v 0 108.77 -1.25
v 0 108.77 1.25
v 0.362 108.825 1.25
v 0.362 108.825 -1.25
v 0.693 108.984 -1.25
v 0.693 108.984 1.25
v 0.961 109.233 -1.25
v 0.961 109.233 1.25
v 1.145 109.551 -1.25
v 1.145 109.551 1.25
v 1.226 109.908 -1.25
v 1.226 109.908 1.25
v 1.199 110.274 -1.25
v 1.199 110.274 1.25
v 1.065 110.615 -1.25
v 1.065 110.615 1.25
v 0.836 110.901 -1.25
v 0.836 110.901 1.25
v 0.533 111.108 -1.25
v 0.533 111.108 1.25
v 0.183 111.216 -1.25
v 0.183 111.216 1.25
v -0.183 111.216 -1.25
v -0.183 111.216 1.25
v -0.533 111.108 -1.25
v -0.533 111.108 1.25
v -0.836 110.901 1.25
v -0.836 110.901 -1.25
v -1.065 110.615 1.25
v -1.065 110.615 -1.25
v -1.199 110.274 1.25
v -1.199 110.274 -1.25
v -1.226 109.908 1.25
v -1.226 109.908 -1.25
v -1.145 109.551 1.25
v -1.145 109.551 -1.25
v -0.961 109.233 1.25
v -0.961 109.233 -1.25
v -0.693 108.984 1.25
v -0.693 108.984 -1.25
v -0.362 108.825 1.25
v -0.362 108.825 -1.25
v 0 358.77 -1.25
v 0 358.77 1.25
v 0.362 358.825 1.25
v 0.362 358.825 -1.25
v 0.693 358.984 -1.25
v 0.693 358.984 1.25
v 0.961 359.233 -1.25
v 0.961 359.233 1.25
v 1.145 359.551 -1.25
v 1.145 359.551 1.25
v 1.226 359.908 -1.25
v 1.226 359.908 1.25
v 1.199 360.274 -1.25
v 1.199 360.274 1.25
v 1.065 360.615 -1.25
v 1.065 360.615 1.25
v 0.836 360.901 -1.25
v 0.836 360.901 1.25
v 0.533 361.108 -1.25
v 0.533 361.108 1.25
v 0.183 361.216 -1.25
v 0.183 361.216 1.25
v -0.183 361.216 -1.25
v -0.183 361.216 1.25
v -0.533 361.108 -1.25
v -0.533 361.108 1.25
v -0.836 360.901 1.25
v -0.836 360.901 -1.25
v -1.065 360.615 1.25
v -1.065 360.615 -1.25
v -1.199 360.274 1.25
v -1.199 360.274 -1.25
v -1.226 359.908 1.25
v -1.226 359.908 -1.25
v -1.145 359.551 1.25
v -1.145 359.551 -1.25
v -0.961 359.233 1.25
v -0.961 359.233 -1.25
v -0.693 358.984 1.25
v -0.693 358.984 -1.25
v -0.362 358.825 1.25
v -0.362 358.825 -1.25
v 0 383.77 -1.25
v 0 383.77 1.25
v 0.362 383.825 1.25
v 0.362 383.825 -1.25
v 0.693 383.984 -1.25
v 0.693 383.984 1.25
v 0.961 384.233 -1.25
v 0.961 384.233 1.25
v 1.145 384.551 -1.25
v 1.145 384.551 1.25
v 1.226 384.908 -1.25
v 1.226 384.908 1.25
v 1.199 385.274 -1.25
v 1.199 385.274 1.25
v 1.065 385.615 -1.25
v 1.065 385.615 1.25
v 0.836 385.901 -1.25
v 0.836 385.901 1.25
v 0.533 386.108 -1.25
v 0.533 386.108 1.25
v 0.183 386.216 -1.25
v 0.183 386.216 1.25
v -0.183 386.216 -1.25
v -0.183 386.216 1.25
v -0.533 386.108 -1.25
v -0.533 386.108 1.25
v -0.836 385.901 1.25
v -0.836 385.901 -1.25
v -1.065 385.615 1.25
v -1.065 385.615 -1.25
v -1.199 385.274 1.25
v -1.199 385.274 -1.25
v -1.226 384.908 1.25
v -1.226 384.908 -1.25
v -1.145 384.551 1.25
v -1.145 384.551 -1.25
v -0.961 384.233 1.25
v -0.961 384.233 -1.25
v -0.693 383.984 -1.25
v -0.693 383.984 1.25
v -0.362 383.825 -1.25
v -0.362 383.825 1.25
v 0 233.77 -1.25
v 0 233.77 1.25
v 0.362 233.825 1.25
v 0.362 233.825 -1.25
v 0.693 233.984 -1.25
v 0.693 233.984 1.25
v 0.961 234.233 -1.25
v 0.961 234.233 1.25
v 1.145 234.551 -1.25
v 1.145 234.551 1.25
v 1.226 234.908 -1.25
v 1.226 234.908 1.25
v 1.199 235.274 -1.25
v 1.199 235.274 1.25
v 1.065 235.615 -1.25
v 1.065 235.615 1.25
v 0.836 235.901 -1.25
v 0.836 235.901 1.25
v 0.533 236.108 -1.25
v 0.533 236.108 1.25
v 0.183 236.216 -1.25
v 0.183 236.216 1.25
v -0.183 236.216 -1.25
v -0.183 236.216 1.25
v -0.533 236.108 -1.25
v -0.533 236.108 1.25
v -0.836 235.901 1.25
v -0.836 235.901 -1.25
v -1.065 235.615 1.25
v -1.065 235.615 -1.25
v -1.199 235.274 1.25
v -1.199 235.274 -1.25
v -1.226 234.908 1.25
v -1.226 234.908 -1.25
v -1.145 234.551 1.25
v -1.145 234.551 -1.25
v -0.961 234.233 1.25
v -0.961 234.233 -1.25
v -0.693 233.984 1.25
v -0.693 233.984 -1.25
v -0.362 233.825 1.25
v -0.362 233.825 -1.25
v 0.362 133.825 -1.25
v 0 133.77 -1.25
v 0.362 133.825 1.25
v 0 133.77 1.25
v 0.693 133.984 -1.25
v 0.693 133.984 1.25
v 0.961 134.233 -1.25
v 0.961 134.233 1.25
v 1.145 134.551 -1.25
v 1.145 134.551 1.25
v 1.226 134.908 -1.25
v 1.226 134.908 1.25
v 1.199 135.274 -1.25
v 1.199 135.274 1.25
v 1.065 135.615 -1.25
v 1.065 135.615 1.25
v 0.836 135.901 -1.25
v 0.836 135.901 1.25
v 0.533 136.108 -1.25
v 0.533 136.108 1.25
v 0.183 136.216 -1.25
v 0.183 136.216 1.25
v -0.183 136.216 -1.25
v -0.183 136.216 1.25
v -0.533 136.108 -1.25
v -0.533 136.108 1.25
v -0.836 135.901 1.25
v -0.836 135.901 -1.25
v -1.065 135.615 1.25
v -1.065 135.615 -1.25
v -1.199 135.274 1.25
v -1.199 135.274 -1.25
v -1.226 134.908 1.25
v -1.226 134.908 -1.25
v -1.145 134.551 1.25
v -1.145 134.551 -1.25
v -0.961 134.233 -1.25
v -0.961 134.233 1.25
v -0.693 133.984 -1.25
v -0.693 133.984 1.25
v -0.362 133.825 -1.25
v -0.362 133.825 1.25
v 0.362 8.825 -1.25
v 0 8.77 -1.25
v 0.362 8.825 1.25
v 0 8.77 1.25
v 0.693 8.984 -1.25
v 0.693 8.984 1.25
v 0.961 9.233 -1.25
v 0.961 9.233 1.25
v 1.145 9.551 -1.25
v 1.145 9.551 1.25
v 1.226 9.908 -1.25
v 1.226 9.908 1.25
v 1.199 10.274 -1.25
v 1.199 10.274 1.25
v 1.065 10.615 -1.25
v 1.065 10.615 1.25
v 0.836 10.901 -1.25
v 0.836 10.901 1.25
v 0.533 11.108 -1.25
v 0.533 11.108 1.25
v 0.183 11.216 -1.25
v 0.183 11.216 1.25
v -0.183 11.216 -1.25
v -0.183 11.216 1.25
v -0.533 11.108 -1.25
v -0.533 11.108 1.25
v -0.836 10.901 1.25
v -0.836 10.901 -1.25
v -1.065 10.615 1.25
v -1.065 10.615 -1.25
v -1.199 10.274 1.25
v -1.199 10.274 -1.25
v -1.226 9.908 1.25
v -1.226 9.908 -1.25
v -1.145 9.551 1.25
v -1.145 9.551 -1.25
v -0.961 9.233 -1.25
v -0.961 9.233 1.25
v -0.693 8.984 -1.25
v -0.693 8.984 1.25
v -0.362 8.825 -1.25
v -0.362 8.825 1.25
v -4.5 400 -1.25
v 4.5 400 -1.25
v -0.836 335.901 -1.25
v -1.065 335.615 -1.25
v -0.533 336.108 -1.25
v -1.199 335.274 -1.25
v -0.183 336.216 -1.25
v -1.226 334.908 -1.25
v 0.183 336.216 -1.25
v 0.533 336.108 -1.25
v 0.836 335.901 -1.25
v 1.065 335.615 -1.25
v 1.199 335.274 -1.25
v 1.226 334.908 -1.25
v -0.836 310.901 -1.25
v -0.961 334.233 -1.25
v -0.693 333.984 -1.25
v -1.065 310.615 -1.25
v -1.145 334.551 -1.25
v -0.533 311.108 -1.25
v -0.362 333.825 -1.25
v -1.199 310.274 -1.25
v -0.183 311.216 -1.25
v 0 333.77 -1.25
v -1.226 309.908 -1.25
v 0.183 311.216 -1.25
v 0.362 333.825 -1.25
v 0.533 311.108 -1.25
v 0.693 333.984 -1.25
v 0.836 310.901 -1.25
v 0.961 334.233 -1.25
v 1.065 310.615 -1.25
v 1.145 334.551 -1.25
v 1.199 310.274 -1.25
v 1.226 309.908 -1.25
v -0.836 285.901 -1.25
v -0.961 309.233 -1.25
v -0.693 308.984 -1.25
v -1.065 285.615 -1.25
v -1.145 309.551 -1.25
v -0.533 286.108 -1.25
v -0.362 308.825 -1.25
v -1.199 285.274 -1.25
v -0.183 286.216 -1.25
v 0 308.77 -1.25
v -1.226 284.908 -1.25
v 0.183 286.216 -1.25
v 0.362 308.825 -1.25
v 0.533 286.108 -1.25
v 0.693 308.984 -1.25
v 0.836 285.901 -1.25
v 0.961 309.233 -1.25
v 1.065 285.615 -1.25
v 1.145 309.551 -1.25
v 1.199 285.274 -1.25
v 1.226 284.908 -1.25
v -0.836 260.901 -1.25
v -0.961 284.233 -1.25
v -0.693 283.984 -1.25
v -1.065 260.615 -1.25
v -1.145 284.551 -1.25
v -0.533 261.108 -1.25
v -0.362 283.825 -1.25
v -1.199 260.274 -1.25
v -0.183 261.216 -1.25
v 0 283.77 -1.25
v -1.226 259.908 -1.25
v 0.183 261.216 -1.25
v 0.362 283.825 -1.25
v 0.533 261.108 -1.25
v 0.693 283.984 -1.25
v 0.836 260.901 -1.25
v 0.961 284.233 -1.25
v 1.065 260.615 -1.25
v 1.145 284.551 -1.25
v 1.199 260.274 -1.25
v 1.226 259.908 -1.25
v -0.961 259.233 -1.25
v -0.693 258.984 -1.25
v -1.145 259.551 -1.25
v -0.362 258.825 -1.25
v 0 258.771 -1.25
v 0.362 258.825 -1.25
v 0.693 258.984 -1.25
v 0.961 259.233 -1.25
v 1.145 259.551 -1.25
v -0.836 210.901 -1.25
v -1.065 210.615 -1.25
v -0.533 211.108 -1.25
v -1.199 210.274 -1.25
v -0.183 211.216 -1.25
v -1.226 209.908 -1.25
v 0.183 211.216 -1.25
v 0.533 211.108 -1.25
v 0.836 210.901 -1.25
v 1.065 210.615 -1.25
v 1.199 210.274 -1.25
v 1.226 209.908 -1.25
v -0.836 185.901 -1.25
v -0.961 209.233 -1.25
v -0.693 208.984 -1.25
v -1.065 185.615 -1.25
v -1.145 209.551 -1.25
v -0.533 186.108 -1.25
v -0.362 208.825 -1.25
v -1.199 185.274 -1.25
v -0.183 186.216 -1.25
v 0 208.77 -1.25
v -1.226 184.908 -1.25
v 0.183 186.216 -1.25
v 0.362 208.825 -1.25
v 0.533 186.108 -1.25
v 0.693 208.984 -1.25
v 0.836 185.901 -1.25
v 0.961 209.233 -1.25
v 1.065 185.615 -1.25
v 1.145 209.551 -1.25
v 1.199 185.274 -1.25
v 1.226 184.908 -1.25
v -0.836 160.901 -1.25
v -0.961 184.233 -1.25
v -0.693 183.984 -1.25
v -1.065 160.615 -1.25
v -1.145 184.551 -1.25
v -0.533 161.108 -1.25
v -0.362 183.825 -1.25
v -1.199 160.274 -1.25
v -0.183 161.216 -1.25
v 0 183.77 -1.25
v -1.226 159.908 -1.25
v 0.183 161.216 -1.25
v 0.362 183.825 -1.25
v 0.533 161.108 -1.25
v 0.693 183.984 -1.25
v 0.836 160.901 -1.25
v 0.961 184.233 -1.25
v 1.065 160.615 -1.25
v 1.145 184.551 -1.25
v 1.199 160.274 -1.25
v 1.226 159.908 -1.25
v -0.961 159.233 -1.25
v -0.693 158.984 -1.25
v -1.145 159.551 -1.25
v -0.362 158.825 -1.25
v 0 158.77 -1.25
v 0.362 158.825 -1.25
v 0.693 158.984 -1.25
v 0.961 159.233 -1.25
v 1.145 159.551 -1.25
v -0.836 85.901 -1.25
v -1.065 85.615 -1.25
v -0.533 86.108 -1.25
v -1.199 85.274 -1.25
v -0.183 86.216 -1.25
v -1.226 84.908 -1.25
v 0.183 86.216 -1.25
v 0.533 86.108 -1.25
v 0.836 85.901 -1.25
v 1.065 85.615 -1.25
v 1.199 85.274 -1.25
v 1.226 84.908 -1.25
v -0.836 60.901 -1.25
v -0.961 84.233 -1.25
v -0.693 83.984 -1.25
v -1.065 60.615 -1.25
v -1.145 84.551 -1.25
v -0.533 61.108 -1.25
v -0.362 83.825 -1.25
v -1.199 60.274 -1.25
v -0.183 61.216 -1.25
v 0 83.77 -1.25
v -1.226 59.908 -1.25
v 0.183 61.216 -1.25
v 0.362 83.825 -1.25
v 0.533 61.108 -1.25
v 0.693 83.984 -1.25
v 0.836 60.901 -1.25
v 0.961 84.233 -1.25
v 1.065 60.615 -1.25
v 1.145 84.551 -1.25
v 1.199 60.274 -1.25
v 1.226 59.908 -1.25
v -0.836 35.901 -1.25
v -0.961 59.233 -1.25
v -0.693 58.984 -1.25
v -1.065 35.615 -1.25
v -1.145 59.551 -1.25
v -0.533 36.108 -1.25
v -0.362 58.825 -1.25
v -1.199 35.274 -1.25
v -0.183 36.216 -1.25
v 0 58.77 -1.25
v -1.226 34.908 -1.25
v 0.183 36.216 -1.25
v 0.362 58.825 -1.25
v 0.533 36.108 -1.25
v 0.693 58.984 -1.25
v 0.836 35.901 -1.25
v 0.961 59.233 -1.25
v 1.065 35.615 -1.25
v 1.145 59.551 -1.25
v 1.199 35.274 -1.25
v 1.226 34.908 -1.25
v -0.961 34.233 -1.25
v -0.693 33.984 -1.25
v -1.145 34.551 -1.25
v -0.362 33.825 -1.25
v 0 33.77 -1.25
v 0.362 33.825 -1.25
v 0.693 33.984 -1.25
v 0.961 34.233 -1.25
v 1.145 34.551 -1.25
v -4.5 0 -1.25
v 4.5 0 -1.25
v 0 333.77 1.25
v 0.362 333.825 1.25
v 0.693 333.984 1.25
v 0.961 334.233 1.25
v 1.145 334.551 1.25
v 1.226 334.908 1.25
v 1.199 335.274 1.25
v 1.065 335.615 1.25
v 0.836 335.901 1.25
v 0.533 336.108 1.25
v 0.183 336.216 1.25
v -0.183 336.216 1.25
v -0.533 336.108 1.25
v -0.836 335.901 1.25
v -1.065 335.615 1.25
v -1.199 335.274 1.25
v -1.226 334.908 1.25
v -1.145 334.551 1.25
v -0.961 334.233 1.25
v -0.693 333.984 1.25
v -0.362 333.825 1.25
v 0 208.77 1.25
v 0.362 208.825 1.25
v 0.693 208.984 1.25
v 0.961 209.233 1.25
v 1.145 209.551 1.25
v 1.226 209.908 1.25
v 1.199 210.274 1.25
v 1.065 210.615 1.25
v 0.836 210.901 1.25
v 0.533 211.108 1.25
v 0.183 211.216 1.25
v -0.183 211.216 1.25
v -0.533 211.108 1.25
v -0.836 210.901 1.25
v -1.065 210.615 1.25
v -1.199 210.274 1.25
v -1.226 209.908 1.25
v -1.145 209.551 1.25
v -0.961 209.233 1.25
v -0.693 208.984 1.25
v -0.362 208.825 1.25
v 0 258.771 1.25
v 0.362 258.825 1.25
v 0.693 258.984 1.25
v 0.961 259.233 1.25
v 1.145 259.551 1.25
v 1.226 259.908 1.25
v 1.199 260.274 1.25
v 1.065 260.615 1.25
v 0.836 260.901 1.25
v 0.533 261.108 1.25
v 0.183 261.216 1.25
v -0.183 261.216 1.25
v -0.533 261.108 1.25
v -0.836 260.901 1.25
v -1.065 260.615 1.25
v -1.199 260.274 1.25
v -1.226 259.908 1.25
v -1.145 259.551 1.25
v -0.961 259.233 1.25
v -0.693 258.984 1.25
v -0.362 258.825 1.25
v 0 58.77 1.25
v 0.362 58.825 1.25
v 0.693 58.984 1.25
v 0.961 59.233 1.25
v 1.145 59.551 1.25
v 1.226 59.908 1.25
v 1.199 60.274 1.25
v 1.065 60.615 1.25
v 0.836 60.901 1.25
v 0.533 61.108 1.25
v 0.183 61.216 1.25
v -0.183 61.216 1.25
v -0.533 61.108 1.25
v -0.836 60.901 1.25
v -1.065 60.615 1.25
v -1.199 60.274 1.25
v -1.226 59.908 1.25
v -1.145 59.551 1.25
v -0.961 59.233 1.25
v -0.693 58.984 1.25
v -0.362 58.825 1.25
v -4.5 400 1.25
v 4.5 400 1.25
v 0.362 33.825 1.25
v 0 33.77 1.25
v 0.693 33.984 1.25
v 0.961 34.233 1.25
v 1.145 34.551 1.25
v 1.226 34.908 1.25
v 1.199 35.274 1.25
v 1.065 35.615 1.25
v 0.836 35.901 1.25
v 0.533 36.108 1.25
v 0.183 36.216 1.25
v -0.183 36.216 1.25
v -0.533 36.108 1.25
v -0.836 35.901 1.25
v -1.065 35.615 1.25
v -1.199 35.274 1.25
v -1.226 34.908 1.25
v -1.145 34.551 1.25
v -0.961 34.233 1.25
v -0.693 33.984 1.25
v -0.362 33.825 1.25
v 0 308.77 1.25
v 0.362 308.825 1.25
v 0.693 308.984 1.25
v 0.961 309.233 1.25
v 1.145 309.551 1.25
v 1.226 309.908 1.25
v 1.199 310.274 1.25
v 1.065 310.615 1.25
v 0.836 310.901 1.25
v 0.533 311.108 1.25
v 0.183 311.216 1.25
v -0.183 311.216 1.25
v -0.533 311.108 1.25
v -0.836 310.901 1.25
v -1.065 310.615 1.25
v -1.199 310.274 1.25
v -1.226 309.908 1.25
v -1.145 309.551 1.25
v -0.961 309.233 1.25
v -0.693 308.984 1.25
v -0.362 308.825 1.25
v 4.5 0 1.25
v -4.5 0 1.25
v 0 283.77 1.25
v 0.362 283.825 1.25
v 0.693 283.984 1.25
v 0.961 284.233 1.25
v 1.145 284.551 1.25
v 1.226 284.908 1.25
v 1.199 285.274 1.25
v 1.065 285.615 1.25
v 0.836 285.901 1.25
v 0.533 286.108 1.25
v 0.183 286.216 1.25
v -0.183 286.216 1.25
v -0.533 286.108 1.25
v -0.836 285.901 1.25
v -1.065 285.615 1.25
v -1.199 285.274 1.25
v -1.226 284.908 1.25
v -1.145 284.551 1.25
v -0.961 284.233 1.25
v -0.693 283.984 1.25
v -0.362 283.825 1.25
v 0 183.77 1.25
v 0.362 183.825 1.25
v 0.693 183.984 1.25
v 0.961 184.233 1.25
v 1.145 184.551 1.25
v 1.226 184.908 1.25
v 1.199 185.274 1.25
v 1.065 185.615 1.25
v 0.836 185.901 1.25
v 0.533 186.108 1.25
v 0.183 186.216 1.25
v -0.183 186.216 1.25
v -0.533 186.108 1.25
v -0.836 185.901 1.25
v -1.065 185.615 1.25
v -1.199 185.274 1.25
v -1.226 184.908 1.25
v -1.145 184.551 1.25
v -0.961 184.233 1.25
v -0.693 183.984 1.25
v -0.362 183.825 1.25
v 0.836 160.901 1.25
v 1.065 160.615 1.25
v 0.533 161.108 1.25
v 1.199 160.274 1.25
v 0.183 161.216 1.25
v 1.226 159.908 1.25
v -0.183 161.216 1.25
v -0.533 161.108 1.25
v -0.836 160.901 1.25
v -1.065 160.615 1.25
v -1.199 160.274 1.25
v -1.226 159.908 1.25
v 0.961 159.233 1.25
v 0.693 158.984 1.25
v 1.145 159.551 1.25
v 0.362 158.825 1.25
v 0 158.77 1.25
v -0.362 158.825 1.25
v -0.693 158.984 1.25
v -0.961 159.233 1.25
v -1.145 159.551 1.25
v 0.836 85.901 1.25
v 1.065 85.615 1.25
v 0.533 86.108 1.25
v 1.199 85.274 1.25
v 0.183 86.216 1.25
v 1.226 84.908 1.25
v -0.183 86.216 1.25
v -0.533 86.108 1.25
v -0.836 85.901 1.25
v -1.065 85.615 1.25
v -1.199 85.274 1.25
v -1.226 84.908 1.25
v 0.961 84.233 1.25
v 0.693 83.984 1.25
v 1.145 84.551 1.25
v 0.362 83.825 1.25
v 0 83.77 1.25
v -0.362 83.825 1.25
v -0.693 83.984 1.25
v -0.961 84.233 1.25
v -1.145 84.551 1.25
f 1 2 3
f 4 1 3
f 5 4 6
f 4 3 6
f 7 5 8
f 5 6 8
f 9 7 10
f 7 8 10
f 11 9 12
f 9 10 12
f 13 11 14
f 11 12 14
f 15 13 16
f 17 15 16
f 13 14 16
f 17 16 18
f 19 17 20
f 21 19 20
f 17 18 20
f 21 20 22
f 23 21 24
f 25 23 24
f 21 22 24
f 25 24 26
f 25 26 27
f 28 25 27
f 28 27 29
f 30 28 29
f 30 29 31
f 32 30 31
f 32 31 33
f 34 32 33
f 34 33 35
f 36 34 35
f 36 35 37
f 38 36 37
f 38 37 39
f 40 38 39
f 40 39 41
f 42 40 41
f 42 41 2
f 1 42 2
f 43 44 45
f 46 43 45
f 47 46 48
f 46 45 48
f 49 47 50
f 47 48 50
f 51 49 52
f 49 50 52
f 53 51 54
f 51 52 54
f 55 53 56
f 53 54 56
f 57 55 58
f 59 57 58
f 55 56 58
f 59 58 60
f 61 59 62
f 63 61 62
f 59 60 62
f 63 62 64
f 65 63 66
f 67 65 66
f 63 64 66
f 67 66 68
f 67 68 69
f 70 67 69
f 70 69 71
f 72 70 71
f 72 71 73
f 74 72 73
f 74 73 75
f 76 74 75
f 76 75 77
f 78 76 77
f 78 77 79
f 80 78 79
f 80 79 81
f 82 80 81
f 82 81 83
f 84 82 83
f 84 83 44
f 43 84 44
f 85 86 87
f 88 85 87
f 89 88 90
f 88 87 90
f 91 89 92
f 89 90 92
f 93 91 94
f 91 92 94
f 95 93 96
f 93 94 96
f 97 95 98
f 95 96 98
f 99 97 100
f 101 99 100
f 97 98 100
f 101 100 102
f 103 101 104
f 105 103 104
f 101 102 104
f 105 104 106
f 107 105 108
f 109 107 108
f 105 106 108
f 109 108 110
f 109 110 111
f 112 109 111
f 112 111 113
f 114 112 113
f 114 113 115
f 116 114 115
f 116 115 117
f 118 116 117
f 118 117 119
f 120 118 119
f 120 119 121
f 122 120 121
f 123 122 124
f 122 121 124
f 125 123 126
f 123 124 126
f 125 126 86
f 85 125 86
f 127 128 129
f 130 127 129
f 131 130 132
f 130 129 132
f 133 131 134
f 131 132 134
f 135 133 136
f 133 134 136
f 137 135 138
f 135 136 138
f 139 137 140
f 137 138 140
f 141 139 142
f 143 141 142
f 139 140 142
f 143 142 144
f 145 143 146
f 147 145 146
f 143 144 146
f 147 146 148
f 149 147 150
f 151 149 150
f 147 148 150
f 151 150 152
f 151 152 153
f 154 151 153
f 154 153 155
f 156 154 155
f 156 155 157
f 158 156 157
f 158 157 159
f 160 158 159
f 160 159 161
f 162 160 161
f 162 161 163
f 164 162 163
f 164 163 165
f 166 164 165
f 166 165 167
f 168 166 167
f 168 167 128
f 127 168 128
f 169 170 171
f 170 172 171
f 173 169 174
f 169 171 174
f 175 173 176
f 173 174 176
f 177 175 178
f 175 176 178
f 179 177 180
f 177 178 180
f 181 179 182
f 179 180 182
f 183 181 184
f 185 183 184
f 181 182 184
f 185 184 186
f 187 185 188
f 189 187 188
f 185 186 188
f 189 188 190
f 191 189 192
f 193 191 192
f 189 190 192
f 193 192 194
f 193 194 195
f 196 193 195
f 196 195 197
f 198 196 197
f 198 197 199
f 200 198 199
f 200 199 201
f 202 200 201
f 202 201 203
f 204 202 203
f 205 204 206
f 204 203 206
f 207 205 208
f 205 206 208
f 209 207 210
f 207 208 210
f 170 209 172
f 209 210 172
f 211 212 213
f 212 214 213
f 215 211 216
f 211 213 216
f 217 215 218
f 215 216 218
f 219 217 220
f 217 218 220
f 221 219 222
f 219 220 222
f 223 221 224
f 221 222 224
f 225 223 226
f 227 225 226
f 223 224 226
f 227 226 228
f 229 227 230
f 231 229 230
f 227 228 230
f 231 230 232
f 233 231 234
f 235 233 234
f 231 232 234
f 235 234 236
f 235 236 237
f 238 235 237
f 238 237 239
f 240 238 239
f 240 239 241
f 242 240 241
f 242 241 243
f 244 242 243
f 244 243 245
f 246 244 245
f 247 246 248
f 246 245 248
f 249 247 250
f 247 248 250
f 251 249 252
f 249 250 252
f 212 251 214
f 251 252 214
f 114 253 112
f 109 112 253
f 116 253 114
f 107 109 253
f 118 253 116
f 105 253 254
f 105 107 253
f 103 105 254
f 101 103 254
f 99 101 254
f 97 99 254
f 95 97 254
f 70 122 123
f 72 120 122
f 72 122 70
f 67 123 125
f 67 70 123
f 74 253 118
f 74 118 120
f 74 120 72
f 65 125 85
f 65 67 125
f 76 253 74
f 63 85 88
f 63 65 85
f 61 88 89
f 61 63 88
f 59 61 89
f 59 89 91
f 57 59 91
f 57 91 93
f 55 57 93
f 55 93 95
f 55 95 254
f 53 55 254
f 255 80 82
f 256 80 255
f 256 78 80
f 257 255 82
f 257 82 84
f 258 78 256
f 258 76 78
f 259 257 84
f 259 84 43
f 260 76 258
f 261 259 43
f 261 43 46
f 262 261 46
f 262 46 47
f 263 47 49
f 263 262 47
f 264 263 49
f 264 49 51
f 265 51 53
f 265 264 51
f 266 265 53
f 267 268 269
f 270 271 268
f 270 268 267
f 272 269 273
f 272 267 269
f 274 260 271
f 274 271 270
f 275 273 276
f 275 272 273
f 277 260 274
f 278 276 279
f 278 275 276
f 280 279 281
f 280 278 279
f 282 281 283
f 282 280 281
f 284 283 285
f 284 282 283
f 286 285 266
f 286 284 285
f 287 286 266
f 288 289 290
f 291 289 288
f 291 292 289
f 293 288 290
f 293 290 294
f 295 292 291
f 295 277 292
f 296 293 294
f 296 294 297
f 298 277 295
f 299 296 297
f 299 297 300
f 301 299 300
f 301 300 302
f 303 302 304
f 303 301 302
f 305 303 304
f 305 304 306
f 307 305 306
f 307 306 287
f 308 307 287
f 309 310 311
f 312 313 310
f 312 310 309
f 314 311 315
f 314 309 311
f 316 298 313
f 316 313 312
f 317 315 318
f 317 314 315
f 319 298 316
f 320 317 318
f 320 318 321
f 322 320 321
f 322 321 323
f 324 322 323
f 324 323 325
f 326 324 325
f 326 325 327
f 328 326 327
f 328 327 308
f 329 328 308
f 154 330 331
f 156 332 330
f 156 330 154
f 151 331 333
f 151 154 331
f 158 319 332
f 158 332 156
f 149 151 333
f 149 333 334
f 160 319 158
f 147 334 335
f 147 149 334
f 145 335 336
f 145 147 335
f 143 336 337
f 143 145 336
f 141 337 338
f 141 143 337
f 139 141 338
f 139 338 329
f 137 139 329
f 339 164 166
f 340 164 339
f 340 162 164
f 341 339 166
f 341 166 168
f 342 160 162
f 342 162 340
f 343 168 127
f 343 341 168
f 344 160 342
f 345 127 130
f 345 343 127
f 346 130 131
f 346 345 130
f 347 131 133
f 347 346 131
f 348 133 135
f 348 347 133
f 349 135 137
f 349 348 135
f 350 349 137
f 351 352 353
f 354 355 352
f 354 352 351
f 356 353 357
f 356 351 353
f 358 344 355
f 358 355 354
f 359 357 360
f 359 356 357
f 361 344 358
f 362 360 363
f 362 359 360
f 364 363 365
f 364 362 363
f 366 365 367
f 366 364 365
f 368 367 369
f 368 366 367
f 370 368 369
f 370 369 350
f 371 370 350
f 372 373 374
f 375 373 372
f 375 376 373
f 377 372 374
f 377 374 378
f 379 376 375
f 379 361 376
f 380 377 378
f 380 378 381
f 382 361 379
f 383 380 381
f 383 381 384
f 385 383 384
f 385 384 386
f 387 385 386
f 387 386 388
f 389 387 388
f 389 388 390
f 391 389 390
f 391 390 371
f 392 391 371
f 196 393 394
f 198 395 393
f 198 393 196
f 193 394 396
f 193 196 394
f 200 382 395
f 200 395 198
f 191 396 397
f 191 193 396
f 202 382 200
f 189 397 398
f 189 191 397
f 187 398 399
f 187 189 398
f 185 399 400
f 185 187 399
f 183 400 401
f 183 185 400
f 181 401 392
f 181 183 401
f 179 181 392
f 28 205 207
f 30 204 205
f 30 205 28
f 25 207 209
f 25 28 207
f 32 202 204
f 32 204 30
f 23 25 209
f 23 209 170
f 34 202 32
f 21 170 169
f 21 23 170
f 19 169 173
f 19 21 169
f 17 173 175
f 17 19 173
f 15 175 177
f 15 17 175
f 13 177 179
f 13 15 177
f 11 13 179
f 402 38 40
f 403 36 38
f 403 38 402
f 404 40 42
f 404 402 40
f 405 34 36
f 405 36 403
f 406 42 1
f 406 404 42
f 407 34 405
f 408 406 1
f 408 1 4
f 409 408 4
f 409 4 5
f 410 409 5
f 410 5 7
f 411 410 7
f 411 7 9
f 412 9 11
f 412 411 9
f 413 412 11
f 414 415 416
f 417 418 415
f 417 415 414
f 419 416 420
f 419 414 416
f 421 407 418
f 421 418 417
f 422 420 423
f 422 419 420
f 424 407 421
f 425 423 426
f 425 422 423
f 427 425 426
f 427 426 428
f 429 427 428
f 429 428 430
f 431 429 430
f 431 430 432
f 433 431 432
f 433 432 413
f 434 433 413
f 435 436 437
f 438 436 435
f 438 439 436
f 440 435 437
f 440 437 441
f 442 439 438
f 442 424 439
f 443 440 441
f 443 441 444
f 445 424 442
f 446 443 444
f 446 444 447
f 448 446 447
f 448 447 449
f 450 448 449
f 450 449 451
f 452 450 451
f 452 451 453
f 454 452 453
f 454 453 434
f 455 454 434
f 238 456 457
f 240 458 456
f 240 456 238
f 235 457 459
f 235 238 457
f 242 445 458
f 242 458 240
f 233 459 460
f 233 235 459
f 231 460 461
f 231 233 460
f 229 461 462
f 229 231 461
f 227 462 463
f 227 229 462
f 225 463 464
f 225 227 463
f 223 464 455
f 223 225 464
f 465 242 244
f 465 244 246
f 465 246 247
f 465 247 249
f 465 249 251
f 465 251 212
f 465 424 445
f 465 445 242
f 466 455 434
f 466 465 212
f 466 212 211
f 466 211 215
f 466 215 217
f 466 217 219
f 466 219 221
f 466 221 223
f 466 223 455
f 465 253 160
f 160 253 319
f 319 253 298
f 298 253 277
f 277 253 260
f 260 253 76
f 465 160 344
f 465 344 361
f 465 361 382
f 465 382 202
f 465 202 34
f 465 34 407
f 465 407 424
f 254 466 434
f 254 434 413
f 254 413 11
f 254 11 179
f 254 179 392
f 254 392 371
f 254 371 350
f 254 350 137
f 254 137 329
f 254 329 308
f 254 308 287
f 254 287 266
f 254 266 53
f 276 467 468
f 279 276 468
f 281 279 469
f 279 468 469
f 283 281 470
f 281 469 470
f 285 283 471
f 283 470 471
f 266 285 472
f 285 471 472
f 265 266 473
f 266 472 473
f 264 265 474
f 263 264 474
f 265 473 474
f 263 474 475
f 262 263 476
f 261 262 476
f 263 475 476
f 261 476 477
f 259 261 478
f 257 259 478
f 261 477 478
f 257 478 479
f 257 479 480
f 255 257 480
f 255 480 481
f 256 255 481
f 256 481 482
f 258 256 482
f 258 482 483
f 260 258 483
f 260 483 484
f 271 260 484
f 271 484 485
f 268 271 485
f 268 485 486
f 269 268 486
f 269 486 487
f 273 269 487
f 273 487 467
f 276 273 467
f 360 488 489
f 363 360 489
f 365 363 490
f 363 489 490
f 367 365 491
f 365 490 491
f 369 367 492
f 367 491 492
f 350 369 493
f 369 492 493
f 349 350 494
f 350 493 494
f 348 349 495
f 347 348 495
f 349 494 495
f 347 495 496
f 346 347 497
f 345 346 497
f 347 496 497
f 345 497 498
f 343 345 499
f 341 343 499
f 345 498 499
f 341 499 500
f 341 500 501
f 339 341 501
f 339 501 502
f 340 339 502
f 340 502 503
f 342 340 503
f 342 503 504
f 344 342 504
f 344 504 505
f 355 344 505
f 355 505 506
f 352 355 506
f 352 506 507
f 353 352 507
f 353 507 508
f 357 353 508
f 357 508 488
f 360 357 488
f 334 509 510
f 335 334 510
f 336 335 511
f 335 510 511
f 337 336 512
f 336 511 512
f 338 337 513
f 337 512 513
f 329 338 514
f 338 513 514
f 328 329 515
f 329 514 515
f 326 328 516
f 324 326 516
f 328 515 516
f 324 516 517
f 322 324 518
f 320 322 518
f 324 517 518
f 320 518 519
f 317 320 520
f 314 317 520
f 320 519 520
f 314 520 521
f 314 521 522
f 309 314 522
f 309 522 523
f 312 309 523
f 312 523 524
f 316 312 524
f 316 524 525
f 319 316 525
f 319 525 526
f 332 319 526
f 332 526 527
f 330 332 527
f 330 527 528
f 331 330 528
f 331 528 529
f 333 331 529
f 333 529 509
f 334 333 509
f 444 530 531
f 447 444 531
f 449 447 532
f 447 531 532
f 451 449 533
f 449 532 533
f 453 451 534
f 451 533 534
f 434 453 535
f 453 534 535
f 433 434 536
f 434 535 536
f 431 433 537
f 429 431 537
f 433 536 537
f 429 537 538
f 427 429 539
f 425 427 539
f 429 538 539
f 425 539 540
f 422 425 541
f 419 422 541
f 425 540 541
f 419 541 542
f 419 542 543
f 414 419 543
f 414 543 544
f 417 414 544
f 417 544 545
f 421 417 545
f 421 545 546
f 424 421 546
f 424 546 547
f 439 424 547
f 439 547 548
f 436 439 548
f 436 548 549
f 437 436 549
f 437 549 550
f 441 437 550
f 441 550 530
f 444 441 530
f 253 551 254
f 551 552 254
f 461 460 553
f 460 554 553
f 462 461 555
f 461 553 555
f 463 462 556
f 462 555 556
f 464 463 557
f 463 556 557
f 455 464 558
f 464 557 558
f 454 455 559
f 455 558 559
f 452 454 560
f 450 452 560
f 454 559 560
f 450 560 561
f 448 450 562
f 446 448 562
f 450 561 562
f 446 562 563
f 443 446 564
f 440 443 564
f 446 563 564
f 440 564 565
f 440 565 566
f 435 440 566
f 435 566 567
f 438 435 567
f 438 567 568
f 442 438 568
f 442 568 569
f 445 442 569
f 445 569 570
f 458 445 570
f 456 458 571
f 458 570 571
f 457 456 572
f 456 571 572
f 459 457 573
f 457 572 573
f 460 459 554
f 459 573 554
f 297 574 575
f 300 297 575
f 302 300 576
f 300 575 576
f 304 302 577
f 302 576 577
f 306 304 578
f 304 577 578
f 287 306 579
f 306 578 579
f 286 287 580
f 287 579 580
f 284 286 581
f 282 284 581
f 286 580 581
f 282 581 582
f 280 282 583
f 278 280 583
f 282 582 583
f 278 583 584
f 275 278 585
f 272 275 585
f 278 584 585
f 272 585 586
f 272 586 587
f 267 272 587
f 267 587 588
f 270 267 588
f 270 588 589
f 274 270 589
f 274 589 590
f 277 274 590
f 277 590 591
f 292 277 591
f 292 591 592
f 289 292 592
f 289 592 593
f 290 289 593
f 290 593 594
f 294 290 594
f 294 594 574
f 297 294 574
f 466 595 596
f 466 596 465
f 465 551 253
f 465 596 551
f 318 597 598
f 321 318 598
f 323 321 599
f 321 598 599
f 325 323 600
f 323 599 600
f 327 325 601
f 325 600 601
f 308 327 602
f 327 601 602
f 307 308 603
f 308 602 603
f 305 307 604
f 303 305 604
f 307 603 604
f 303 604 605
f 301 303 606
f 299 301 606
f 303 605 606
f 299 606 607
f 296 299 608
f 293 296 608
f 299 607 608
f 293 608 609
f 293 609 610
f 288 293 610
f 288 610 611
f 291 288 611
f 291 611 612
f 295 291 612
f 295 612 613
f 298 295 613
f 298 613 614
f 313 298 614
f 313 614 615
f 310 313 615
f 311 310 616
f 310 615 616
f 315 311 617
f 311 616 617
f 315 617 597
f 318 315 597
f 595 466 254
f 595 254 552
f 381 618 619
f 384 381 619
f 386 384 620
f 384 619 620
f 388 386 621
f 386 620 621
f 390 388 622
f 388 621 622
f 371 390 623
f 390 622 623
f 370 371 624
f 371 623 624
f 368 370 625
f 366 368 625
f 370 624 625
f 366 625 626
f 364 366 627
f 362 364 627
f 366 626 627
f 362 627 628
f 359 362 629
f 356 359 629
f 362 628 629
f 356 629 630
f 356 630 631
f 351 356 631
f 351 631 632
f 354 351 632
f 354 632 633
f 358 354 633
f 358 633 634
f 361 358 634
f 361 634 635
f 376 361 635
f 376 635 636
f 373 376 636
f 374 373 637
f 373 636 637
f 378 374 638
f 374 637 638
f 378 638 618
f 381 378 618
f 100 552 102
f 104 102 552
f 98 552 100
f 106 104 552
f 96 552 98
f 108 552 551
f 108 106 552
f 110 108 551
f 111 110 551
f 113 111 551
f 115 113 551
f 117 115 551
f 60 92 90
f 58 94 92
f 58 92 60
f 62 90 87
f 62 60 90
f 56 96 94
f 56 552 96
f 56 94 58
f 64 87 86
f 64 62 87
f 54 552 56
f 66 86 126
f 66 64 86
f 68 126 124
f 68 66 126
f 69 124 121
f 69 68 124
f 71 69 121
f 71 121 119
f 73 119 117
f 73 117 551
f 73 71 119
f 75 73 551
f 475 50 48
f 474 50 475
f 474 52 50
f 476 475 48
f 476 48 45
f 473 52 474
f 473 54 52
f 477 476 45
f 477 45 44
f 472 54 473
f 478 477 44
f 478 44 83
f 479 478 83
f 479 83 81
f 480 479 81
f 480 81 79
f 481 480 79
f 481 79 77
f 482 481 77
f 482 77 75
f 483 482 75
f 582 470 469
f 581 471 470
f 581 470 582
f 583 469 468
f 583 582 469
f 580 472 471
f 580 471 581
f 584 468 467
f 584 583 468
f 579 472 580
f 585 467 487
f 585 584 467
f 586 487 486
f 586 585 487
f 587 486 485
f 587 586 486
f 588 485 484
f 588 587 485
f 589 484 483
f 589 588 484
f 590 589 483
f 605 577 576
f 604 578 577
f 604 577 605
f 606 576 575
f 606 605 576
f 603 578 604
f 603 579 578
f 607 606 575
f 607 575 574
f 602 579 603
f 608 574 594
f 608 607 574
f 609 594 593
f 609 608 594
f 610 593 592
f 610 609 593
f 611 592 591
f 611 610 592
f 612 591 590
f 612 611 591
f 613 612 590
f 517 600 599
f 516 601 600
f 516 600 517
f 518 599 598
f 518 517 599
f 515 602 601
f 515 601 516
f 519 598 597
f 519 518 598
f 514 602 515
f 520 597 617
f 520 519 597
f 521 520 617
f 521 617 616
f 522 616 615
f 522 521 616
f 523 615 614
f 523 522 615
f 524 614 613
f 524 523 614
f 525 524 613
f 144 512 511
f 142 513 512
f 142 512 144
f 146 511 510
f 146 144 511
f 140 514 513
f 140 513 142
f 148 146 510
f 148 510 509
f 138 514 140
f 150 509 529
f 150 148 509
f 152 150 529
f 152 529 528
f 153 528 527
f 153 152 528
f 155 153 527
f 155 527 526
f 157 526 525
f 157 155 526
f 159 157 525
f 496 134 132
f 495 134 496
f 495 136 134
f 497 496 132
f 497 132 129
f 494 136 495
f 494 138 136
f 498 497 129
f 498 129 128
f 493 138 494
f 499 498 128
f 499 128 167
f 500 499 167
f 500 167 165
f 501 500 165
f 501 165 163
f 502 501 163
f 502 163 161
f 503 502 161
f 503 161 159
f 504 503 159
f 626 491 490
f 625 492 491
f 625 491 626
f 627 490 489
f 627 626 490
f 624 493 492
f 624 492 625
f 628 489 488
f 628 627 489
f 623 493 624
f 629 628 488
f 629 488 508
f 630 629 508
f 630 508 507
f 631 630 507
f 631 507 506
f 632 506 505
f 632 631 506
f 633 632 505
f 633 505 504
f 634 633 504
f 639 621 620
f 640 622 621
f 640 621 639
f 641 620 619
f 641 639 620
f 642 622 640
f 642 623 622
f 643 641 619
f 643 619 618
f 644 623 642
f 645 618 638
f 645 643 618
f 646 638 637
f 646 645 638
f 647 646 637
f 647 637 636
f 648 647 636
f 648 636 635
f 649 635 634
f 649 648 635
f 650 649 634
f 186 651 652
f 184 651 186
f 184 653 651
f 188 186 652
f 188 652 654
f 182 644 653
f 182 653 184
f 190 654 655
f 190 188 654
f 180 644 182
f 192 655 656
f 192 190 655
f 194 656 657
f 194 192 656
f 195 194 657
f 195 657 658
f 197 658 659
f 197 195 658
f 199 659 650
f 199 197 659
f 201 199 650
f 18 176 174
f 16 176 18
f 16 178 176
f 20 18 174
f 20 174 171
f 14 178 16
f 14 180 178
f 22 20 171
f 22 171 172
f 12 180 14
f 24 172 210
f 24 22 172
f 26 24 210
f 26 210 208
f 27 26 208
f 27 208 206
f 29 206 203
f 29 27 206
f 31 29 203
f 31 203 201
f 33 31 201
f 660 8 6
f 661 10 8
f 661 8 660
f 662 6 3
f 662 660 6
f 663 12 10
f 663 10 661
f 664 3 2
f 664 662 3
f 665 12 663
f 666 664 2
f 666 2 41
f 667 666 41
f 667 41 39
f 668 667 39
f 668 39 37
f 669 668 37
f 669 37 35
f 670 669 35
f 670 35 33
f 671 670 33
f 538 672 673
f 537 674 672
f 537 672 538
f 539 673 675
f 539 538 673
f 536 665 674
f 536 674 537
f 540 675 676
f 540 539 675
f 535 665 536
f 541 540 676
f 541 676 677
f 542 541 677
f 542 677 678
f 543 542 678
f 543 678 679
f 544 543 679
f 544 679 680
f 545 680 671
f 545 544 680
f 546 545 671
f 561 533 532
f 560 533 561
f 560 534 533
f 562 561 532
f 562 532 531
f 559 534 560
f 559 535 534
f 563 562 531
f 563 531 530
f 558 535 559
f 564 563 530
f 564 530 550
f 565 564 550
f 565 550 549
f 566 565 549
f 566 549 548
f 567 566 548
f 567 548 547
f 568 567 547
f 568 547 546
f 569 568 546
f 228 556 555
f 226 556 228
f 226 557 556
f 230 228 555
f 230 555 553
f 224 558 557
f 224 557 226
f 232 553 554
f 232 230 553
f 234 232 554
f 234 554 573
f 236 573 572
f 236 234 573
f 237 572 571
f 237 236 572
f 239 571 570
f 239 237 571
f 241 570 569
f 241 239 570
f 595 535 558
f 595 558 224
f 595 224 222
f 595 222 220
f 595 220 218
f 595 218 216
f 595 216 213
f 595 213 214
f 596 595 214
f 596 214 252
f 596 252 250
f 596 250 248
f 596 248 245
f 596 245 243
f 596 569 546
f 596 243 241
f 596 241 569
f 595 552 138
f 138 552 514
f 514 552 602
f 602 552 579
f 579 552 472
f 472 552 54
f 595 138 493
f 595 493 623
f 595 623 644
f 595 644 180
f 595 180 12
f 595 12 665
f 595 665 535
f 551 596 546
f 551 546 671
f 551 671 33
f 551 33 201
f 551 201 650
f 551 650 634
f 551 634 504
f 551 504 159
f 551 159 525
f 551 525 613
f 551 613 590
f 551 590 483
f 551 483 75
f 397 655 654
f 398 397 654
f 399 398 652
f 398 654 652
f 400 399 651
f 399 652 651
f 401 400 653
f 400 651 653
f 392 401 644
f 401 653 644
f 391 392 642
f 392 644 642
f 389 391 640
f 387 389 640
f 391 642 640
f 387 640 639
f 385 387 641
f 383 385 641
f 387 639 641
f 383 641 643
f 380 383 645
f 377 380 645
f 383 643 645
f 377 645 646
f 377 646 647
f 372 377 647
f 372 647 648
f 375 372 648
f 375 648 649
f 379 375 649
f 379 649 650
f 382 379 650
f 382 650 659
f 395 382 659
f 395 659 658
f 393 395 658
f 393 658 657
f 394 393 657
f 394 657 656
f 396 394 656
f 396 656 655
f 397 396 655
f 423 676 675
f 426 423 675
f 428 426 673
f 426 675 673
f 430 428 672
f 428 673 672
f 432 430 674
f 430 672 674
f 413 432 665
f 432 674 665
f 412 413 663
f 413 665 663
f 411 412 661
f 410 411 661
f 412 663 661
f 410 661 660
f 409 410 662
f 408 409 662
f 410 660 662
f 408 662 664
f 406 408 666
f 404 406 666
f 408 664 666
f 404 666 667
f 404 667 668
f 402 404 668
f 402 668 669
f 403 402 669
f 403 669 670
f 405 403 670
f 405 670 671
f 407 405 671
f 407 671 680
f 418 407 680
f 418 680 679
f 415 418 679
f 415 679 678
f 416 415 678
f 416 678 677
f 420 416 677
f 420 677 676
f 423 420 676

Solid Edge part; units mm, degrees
sketch "Sketch1" plane through (0, 0, 0) normal (0, -1, 0) x (1, 0, 0)
  line L0 (-4.5, -1.25) -> (4.5, -1.25)
  line L1 (4.5, -1.25) -> (4.5, 1.25)
  line L2 (4.5, 1.25) -> (-4.5, 1.25)
  line L3 (-4.5, 1.25) -> (-4.5, -1.25)
  dimension "D1" = 9
  dimension "D2" = 2.5
extrude "Protrusion1" add sketch "Sketch1" against normal blind 400
hole "Hole_1" at (0, 10, 1.25) direction (0, 0, -1) diameter 2.459 end up to next
pattern_linear "Pattern1" count 16 spacing 25 along (0, 1, 0) of "Hole_1"
properties material "Stainless Steel, 304"
